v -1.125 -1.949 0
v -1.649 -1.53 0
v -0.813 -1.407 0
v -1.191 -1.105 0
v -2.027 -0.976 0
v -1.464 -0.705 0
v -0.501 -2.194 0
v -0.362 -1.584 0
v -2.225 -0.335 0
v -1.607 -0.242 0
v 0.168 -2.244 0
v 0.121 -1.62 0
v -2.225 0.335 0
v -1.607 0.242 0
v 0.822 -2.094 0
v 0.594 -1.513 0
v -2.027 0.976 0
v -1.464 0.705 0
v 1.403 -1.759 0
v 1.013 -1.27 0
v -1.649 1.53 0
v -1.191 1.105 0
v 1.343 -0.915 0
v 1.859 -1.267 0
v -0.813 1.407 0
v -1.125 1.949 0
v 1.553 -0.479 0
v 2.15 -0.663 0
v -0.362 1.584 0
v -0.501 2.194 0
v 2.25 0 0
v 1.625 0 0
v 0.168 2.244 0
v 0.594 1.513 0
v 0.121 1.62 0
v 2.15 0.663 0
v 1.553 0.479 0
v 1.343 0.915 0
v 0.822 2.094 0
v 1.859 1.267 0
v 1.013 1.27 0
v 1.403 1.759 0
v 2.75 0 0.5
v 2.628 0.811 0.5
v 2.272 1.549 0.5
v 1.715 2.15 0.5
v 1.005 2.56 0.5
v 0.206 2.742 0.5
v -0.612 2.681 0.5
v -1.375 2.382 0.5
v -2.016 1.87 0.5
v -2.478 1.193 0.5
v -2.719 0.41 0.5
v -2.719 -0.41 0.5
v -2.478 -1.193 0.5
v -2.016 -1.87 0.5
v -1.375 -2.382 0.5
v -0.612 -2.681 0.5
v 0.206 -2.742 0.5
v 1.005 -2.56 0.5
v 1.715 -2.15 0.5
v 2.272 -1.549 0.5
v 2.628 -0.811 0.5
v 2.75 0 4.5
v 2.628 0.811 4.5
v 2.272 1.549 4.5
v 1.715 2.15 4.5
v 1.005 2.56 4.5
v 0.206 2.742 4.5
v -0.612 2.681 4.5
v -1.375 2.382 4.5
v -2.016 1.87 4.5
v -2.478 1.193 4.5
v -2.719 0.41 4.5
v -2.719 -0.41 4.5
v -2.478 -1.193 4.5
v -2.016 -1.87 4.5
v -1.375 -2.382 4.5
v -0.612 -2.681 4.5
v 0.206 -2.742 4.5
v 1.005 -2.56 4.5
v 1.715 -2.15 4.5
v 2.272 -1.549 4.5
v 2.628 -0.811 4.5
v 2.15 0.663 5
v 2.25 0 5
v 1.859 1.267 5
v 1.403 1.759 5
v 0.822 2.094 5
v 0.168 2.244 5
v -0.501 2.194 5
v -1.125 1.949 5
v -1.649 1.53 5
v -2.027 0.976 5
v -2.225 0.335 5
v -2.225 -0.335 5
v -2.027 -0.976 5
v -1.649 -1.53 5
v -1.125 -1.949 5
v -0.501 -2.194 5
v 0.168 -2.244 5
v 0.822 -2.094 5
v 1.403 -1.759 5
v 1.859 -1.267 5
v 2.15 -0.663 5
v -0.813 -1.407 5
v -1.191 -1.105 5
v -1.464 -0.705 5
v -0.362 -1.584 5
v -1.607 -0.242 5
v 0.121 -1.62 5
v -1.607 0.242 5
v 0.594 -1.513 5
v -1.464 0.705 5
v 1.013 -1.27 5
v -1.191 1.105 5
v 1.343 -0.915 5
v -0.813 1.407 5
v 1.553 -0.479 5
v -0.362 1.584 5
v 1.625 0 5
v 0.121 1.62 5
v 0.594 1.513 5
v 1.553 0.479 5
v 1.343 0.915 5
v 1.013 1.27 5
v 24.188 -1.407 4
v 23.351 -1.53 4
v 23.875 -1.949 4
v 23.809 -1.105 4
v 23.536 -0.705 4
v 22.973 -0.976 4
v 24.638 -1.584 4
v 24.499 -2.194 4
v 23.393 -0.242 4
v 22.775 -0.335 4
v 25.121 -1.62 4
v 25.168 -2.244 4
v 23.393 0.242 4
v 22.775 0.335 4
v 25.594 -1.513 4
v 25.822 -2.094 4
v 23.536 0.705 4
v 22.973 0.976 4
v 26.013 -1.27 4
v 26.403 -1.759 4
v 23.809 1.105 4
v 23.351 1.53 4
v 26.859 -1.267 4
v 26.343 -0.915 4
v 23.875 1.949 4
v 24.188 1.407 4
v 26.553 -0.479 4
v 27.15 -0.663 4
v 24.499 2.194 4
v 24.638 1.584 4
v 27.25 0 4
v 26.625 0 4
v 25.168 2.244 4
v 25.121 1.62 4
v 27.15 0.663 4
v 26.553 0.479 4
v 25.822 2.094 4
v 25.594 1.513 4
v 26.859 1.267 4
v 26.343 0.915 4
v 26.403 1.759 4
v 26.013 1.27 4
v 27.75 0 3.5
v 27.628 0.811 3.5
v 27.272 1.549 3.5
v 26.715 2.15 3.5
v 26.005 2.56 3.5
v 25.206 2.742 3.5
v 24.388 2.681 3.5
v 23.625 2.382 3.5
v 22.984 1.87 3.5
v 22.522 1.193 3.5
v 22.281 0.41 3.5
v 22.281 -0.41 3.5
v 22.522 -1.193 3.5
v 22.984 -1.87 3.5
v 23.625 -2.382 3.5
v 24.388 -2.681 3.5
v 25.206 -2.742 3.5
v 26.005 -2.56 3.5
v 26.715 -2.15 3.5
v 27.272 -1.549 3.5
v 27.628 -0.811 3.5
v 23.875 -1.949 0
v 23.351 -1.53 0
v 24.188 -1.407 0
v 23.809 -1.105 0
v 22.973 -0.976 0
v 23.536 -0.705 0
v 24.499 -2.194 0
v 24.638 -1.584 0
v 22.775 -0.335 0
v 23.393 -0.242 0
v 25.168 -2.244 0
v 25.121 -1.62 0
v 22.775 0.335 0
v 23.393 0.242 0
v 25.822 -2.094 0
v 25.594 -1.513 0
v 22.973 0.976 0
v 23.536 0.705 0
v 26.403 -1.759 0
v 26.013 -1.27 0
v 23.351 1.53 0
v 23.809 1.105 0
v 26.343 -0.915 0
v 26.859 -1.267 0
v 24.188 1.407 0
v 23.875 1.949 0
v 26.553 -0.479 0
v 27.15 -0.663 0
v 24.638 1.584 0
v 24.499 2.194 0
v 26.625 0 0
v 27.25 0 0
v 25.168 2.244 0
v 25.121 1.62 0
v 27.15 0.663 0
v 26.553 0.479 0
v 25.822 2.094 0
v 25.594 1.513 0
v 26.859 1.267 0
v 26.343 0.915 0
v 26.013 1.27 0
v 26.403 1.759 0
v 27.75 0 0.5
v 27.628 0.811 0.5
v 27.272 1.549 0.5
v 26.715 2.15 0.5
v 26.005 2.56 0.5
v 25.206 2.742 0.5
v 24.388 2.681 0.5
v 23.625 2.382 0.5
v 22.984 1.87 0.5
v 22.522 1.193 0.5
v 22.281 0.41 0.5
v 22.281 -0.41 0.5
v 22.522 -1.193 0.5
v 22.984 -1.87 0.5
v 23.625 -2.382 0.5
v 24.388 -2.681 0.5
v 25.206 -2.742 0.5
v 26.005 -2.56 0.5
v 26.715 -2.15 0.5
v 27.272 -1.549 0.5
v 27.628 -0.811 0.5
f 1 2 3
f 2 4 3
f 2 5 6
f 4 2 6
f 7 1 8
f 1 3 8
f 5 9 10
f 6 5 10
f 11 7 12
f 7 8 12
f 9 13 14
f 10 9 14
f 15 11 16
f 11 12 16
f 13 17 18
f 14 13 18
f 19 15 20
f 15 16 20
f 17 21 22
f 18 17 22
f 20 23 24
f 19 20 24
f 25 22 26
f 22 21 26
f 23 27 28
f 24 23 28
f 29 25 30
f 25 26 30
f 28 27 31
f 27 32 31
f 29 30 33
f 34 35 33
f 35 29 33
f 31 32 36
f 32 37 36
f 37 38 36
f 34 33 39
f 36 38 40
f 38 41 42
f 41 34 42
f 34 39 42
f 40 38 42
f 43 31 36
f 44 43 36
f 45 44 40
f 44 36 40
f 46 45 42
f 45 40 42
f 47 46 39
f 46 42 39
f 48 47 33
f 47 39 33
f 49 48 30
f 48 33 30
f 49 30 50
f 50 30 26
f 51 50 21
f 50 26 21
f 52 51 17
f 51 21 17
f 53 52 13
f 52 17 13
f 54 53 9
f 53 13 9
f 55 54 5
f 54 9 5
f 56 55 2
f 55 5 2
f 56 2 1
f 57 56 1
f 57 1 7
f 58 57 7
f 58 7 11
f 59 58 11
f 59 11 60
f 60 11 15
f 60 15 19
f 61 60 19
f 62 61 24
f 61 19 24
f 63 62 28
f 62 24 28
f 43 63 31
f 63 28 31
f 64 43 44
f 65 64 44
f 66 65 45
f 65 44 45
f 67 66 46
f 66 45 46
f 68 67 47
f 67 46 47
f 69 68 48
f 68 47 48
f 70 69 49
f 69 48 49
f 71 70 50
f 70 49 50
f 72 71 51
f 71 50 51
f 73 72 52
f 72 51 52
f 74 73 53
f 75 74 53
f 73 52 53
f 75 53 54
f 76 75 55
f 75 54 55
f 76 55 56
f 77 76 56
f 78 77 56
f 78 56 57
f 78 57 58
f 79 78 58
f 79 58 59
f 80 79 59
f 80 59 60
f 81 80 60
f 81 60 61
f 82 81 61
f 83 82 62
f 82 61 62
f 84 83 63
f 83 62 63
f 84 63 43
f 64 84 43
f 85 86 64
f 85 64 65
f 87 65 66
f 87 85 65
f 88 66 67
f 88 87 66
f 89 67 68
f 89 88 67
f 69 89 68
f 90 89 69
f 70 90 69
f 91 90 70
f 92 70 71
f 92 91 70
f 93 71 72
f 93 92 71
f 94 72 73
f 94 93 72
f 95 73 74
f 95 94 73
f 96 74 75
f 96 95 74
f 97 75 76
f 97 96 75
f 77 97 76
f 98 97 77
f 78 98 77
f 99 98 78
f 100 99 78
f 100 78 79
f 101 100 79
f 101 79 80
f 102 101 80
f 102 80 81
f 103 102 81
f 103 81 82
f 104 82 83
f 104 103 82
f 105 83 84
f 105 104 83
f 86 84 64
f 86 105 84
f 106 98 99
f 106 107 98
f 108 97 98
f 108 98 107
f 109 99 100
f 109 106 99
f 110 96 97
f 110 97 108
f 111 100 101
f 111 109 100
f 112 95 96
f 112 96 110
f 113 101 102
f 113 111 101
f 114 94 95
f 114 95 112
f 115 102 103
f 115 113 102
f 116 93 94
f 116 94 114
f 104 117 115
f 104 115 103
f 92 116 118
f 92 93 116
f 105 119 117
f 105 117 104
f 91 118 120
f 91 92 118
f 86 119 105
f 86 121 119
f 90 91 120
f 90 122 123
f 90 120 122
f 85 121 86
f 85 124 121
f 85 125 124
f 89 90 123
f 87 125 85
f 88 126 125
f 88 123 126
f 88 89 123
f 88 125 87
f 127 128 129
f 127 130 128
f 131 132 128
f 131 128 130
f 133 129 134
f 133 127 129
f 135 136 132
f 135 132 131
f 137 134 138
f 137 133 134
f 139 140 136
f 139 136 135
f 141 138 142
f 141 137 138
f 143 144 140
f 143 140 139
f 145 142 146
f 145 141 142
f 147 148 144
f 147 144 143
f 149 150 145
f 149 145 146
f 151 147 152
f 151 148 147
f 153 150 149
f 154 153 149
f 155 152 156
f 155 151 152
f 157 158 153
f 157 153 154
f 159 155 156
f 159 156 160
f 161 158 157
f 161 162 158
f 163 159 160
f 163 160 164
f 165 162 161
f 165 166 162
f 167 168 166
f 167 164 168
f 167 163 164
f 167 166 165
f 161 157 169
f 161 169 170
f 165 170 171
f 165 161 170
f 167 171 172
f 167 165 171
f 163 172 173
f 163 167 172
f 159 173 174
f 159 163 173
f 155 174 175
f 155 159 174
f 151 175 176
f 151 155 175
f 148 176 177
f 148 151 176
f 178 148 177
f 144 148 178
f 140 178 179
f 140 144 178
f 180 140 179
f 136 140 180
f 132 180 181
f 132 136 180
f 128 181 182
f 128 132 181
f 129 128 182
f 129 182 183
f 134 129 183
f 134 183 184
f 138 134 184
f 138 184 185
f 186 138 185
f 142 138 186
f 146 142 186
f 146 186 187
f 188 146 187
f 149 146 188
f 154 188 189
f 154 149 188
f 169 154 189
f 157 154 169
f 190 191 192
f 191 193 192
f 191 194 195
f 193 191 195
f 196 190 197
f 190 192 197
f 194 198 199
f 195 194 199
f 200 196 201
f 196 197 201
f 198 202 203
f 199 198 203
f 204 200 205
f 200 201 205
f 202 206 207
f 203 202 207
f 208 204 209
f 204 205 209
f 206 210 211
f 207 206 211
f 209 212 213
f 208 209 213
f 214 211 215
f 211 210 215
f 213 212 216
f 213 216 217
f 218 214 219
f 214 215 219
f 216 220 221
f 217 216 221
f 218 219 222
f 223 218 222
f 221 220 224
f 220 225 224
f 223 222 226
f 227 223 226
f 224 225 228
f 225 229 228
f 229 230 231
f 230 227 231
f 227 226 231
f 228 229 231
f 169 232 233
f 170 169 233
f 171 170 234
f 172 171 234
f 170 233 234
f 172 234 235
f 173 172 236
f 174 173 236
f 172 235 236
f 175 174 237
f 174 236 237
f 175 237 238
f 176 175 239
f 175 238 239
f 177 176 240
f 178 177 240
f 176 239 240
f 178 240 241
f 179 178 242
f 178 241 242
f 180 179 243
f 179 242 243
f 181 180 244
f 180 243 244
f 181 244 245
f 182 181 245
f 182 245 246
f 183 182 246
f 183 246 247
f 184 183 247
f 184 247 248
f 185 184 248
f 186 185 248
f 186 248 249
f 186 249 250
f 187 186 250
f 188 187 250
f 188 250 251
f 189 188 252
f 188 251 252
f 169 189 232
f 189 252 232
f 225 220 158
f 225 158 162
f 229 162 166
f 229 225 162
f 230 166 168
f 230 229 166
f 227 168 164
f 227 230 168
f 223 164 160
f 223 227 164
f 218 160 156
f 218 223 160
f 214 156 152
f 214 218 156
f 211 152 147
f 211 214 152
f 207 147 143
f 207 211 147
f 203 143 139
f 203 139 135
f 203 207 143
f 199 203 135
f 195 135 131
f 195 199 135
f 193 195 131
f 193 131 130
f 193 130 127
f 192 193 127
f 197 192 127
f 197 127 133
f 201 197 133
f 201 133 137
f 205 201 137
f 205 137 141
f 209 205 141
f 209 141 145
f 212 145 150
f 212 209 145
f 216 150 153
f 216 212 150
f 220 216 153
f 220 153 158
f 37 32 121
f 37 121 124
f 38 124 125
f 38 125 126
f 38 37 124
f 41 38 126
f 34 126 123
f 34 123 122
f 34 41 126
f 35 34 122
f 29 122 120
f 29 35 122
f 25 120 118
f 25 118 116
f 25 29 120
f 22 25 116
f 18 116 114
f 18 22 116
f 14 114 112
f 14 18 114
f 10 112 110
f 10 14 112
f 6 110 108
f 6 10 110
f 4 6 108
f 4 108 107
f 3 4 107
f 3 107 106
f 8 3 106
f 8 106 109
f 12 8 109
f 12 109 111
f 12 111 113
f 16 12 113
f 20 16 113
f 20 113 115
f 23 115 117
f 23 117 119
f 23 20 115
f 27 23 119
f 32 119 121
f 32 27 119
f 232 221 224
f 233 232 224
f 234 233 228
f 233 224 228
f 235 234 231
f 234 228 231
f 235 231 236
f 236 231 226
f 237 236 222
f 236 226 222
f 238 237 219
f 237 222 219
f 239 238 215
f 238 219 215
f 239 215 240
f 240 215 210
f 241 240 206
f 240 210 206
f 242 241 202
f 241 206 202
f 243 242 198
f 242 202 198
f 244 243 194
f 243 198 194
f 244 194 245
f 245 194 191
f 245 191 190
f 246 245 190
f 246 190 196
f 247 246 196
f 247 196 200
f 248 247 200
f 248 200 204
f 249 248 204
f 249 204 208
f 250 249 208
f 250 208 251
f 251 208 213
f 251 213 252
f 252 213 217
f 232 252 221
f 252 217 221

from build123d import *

# Parameters (mm, degrees)
F0_R      = 2.75
F0_R_2    = 1.625
F1_DEPTH  = 5
F2_DEPTH  = 4
F3_SIZE   = 0.5
F3_2_SIZE = 0.5


with BuildPart() as f1:
    # F0 (on Top) → F1 (new body)
    with BuildSketch(Plane.XY):
        Circle(F0_R)
        Circle(F0_R_2, mode=Mode.SUBTRACT)
    extrude(amount=F1_DEPTH)

    # F3
    f3_edges = [f1.edges().sort_by_distance(p)[0] for p in [
        (-2.75, 0, 5),
        (-2.75, 0, 0),
    ]]
    chamfer(f3_edges, length=F3_SIZE)


with BuildPart() as f2:
    # F0 (on Top) → F2 (new body)
    with BuildSketch(Plane.XY):
        with Locations((25, 0)):
            Circle(F0_R)
        with Locations((25, 0)):
            Circle(F0_R_2, mode=Mode.SUBTRACT)
    extrude(amount=F2_DEPTH)

    # F3#2
    f3_2_edges = [f2.edges().sort_by_distance(p)[0] for p in [
        (22.25, 0, 0),
        (22.25, 0, 4),
    ]]
    chamfer(f3_2_edges, length=F3_2_SIZE)


solid = Compound([f1.part, f2.part])
